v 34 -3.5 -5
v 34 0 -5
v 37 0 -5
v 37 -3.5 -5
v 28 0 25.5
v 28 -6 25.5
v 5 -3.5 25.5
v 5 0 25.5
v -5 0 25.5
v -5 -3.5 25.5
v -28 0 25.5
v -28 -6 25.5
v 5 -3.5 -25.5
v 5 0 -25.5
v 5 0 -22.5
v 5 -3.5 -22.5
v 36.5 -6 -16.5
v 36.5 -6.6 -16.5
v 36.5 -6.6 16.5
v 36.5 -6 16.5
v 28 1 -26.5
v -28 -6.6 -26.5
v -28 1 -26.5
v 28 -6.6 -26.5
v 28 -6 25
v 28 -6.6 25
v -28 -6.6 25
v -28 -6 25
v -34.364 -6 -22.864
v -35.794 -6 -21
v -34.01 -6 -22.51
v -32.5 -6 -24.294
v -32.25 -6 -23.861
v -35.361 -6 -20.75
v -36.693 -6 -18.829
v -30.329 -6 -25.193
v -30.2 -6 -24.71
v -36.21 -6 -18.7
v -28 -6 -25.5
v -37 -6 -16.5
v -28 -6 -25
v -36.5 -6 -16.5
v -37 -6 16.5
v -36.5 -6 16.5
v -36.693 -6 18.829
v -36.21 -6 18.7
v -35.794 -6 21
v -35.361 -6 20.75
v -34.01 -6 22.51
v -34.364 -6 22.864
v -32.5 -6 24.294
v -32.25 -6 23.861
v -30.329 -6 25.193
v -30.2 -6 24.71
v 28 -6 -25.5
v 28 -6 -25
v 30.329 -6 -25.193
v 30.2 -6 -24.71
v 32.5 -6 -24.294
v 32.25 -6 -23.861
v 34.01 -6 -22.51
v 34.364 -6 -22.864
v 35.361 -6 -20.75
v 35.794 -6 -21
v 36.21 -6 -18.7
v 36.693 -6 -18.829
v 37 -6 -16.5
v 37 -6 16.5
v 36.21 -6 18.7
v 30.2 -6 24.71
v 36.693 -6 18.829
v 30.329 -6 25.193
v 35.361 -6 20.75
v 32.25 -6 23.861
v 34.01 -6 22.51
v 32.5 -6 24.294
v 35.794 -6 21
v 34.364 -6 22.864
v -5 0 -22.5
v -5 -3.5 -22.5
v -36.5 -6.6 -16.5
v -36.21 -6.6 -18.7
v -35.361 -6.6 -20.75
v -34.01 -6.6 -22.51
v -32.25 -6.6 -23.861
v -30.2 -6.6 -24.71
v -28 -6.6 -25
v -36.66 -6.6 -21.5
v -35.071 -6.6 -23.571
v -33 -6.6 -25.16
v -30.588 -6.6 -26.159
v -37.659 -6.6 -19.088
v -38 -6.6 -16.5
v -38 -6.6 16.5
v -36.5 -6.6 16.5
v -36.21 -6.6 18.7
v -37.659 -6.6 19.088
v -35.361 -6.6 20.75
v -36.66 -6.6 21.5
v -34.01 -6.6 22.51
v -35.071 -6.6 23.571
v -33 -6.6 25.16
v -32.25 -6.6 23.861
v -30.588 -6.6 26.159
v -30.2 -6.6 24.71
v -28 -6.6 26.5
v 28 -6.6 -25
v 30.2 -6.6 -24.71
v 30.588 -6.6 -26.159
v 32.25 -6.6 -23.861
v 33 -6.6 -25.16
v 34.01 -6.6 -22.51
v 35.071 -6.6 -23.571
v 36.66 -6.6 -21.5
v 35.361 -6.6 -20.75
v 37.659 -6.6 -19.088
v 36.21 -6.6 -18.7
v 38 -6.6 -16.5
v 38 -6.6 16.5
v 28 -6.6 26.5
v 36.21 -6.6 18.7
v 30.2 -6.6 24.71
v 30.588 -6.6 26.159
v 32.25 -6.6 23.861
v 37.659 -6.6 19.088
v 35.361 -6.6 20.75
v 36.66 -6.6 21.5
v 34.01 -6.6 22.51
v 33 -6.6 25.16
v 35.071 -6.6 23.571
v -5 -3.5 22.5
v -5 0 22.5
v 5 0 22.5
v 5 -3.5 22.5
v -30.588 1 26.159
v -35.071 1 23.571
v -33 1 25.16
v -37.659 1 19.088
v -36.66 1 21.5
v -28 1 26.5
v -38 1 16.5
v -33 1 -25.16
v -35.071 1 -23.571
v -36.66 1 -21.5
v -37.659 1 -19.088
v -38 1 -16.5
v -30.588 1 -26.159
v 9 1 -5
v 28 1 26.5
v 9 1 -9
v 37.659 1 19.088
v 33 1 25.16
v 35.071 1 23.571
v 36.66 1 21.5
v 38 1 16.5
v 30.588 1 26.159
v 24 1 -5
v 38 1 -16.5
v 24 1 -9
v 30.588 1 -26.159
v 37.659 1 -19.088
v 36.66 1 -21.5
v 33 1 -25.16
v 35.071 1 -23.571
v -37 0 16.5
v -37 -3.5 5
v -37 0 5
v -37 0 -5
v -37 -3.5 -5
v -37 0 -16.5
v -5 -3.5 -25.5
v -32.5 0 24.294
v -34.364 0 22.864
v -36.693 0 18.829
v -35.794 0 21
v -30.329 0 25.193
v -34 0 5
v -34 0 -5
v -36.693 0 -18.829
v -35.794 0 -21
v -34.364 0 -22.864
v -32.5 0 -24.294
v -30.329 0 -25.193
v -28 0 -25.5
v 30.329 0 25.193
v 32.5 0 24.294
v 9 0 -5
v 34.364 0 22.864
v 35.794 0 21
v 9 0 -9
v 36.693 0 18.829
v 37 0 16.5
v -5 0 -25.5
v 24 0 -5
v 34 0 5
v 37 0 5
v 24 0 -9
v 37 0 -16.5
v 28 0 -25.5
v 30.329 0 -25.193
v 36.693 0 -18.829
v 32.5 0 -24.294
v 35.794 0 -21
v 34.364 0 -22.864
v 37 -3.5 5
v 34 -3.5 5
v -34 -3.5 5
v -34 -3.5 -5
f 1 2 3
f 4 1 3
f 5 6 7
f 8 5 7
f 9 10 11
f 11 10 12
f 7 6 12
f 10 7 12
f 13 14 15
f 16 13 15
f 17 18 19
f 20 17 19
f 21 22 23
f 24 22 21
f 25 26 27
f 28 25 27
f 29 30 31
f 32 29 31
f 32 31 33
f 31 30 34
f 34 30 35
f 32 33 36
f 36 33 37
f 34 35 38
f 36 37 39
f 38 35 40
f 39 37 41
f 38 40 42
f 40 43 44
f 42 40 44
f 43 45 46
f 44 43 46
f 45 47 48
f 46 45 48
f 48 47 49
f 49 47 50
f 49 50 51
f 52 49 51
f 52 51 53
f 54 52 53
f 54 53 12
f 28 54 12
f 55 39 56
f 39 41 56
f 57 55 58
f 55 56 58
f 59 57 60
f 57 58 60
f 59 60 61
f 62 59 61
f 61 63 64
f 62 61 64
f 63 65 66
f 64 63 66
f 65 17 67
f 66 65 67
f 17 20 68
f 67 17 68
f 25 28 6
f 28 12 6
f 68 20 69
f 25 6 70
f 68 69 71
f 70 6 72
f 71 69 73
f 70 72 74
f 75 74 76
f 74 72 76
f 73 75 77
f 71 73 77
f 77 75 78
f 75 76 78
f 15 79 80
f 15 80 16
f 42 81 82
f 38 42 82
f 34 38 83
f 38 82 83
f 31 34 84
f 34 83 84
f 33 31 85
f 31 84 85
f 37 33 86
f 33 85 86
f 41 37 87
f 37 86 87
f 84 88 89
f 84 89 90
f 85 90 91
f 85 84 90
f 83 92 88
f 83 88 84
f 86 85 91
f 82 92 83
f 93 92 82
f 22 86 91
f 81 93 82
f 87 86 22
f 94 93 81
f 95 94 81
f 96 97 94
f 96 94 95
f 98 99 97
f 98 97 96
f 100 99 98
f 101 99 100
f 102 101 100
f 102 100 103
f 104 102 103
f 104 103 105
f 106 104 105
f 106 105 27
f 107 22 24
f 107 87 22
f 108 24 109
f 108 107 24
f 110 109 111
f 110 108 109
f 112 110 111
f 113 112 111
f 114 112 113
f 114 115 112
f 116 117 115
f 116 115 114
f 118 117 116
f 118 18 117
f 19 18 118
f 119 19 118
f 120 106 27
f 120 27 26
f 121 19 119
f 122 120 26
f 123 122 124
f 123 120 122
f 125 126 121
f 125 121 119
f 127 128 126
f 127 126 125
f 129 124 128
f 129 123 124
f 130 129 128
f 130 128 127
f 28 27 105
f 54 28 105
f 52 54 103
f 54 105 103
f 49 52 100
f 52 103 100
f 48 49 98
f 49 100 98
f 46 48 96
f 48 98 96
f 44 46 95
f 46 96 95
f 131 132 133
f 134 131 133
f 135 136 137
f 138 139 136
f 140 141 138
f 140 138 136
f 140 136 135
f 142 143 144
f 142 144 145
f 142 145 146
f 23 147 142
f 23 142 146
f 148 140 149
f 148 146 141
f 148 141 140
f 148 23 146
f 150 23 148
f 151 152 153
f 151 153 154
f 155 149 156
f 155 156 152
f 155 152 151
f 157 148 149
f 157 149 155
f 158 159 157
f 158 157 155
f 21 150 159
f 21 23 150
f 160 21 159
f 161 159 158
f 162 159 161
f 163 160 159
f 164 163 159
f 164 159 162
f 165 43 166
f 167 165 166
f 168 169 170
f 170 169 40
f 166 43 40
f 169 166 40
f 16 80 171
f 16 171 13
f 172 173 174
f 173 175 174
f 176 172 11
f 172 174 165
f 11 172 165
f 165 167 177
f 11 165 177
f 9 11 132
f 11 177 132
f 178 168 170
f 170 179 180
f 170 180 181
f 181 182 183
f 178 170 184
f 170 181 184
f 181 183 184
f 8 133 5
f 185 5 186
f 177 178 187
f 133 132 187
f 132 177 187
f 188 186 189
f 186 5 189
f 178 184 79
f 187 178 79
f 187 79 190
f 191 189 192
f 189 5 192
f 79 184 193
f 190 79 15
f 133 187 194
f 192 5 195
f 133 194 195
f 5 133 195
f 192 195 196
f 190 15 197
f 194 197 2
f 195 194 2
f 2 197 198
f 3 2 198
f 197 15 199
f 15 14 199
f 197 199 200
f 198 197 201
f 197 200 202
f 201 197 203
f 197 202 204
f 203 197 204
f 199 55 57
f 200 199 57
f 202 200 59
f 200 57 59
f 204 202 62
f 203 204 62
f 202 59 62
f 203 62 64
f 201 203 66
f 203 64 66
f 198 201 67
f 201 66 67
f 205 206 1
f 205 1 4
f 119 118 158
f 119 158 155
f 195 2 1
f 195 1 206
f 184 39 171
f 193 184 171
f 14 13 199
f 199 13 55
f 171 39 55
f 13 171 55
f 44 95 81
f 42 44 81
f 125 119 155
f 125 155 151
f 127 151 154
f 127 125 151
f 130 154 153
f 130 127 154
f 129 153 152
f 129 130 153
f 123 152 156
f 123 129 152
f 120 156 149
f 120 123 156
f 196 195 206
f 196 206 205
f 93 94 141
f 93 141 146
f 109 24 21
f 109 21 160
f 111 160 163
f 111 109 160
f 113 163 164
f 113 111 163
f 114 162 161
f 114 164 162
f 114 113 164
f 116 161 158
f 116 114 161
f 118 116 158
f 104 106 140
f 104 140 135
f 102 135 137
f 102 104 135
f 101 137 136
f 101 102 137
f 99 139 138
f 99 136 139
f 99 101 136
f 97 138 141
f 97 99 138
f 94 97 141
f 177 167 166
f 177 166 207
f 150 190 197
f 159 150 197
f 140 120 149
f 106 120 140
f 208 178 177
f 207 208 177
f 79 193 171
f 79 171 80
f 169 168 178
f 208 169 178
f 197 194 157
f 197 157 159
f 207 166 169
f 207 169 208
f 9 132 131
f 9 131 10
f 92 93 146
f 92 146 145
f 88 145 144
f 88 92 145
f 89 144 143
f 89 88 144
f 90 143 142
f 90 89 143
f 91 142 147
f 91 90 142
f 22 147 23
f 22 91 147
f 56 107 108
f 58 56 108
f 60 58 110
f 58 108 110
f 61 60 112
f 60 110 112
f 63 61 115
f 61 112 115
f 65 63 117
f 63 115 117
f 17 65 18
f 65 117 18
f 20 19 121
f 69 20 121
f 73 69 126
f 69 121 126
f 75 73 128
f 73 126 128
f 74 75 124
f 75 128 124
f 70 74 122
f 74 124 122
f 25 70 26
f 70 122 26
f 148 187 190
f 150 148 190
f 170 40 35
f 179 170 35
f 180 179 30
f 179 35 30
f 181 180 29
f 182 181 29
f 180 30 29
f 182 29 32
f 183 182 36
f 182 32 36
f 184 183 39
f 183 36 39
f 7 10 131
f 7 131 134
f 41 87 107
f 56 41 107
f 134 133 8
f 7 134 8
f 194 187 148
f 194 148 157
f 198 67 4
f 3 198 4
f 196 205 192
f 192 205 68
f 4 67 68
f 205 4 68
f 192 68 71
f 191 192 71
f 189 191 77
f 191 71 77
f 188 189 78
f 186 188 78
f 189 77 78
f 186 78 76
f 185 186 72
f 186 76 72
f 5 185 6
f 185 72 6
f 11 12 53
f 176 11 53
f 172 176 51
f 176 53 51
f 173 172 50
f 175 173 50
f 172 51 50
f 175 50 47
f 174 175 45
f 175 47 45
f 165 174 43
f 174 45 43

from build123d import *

# Parameters (mm, degrees)
SKETCH1_W           = 15
SKETCH1_H           = 4
BOSS_EXTRUDE1_DEPTH = 1
BOSS_EXTRUDE2_START = 6
BOSS_EXTRUDE2_DEPTH = 6
SKETCH3_W           = 10
SKETCH3_H           = 3
BOSS_EXTRUDE3_DEPTH = 3.5
BOSS_EXTRUDE4_START = 0.6
BOSS_EXTRUDE4_DEPTH = 0.6
SKETCH5_W           = 3
SKETCH5_H           = 10
BOSS_EXTRUDE5_DEPTH = 3.5


with BuildPart() as part:
    # Sketch1 → Boss-Extrude1 (new body)
    with BuildSketch(Plane(origin=(0, 0, 0), x_dir=(1, 0, 0), z_dir=(0, 1, 0))):
        with BuildLine():
            Line((-28, -26.5), (28, -26.5))
            ThreePointArc((28, -26.5), (35.071067812, -23.571067812), (38, -16.5))
            Line((38, -16.5), (38, 16.5))
            ThreePointArc((38, 16.5), (35.071067812, 23.571067812), (28, 26.5))
            Line((28, 26.5), (-28, 26.5))
            ThreePointArc((-28, 26.5), (-35.071067812, 23.571067812), (-38, 16.5))
            Line((-38, 16.5), (-38, -16.5))
            ThreePointArc((-38, -16.5), (-35.071067812, -23.571067812), (-28, -26.5))
        make_face()
        with Locations((16.5, 7)):
            Rectangle(SKETCH1_W, SKETCH1_H, mode=Mode.SUBTRACT)
    extrude(amount=BOSS_EXTRUDE1_DEPTH)

    # Sketch2 → Boss-Extrude2 (add)
    with BuildSketch(Plane.XZ.offset(BOSS_EXTRUDE2_START)):
        with BuildLine():
            Line((-28, -26.5), (28, -26.5))
            ThreePointArc((28, -26.5), (35.071067812, -23.571067812), (38, -16.5))
            Line((38, -16.5), (38, 16.5))
            ThreePointArc((38, 16.5), (35.071067812, 23.571067812), (28, 26.5))
            Line((28, 26.5), (-28, 26.5))
            ThreePointArc((-28, 26.5), (-35.071067812, 23.571067812), (-38, 16.5))
            Line((-38, 16.5), (-38, -16.5))
            ThreePointArc((-38, -16.5), (-35.071067812, -23.571067812), (-28, -26.5))
        make_face()
        with BuildLine():
            Line((28, 25.5), (-28, 25.5))
            ThreePointArc((-28, 25.5), (-34.363961031, 22.863961031), (-37, 16.5))
            Line((-37, 16.5), (-37, -16.5))
            ThreePointArc((-37, -16.5), (-34.363961031, -22.863961031), (-28, -25.5))
            Line((-28, -25.5), (28, -25.5))
            ThreePointArc((28, -25.5), (34.363961031, -22.863961031), (37, -16.5))
            Line((37, -16.5), (37, 16.5))
            ThreePointArc((37, 16.5), (34.363961031, 22.863961031), (28, 25.5))
        make_face(mode=Mode.SUBTRACT)
    extrude(amount=-BOSS_EXTRUDE2_DEPTH)

    # Sketch3 → Boss-Extrude3 (add)
    with BuildSketch(Plane.XZ):
        with Locations((0, -24)):
            Rectangle(SKETCH3_W, SKETCH3_H)
        with Locations((0, 24)):
            Rectangle(SKETCH3_W, SKETCH3_H)
    extrude(amount=BOSS_EXTRUDE3_DEPTH)

    # Sketch4 → Boss-Extrude4 (add)
    with BuildSketch(Plane.XZ.offset(6).offset(BOSS_EXTRUDE4_START)):
        with BuildLine():
            Line((-28, -26.5), (28, -26.5))
            ThreePointArc((28, -26.5), (35.071067812, -23.571067812), (38, -16.5))
            Line((38, -16.5), (38, 16.5))
            ThreePointArc((38, 16.5), (35.071067812, 23.571067812), (28, 26.5))
            Line((28, 26.5), (-28, 26.5))
            ThreePointArc((-28, 26.5), (-35.071067812, 23.571067812), (-38, 16.5))
            Line((-38, 16.5), (-38, -16.5))
            ThreePointArc((-38, -16.5), (-35.071067812, -23.571067812), (-28, -26.5))
        make_face()
        with BuildLine():
            Line((28, 25), (-28, 25))
            ThreePointArc((-28, 25), (-34.01040764, 22.51040764), (-36.5, 16.5))
            Line((-36.5, 16.5), (-36.5, -16.5))
            ThreePointArc((-36.5, -16.5), (-34.01040764, -22.51040764), (-28, -25))
            Line((-28, -25), (28, -25))
            ThreePointArc((28, -25), (34.01040764, -22.51040764), (36.5, -16.5))
            Line((36.5, -16.5), (36.5, 16.5))
            ThreePointArc((36.5, 16.5), (34.01040764, 22.51040764), (28, 25))
        make_face(mode=Mode.SUBTRACT)
    extrude(amount=-BOSS_EXTRUDE4_DEPTH)

    # Sketch5 → Boss-Extrude5 (add)
    with BuildSketch(Plane.XZ):
        with Locations((35.5, 0)):
            Rectangle(SKETCH5_W, SKETCH5_H)
        with Locations((-35.5, 0)):
            Rectangle(SKETCH5_W, SKETCH5_H)
    extrude(amount=BOSS_EXTRUDE5_DEPTH)


solid = part.part
